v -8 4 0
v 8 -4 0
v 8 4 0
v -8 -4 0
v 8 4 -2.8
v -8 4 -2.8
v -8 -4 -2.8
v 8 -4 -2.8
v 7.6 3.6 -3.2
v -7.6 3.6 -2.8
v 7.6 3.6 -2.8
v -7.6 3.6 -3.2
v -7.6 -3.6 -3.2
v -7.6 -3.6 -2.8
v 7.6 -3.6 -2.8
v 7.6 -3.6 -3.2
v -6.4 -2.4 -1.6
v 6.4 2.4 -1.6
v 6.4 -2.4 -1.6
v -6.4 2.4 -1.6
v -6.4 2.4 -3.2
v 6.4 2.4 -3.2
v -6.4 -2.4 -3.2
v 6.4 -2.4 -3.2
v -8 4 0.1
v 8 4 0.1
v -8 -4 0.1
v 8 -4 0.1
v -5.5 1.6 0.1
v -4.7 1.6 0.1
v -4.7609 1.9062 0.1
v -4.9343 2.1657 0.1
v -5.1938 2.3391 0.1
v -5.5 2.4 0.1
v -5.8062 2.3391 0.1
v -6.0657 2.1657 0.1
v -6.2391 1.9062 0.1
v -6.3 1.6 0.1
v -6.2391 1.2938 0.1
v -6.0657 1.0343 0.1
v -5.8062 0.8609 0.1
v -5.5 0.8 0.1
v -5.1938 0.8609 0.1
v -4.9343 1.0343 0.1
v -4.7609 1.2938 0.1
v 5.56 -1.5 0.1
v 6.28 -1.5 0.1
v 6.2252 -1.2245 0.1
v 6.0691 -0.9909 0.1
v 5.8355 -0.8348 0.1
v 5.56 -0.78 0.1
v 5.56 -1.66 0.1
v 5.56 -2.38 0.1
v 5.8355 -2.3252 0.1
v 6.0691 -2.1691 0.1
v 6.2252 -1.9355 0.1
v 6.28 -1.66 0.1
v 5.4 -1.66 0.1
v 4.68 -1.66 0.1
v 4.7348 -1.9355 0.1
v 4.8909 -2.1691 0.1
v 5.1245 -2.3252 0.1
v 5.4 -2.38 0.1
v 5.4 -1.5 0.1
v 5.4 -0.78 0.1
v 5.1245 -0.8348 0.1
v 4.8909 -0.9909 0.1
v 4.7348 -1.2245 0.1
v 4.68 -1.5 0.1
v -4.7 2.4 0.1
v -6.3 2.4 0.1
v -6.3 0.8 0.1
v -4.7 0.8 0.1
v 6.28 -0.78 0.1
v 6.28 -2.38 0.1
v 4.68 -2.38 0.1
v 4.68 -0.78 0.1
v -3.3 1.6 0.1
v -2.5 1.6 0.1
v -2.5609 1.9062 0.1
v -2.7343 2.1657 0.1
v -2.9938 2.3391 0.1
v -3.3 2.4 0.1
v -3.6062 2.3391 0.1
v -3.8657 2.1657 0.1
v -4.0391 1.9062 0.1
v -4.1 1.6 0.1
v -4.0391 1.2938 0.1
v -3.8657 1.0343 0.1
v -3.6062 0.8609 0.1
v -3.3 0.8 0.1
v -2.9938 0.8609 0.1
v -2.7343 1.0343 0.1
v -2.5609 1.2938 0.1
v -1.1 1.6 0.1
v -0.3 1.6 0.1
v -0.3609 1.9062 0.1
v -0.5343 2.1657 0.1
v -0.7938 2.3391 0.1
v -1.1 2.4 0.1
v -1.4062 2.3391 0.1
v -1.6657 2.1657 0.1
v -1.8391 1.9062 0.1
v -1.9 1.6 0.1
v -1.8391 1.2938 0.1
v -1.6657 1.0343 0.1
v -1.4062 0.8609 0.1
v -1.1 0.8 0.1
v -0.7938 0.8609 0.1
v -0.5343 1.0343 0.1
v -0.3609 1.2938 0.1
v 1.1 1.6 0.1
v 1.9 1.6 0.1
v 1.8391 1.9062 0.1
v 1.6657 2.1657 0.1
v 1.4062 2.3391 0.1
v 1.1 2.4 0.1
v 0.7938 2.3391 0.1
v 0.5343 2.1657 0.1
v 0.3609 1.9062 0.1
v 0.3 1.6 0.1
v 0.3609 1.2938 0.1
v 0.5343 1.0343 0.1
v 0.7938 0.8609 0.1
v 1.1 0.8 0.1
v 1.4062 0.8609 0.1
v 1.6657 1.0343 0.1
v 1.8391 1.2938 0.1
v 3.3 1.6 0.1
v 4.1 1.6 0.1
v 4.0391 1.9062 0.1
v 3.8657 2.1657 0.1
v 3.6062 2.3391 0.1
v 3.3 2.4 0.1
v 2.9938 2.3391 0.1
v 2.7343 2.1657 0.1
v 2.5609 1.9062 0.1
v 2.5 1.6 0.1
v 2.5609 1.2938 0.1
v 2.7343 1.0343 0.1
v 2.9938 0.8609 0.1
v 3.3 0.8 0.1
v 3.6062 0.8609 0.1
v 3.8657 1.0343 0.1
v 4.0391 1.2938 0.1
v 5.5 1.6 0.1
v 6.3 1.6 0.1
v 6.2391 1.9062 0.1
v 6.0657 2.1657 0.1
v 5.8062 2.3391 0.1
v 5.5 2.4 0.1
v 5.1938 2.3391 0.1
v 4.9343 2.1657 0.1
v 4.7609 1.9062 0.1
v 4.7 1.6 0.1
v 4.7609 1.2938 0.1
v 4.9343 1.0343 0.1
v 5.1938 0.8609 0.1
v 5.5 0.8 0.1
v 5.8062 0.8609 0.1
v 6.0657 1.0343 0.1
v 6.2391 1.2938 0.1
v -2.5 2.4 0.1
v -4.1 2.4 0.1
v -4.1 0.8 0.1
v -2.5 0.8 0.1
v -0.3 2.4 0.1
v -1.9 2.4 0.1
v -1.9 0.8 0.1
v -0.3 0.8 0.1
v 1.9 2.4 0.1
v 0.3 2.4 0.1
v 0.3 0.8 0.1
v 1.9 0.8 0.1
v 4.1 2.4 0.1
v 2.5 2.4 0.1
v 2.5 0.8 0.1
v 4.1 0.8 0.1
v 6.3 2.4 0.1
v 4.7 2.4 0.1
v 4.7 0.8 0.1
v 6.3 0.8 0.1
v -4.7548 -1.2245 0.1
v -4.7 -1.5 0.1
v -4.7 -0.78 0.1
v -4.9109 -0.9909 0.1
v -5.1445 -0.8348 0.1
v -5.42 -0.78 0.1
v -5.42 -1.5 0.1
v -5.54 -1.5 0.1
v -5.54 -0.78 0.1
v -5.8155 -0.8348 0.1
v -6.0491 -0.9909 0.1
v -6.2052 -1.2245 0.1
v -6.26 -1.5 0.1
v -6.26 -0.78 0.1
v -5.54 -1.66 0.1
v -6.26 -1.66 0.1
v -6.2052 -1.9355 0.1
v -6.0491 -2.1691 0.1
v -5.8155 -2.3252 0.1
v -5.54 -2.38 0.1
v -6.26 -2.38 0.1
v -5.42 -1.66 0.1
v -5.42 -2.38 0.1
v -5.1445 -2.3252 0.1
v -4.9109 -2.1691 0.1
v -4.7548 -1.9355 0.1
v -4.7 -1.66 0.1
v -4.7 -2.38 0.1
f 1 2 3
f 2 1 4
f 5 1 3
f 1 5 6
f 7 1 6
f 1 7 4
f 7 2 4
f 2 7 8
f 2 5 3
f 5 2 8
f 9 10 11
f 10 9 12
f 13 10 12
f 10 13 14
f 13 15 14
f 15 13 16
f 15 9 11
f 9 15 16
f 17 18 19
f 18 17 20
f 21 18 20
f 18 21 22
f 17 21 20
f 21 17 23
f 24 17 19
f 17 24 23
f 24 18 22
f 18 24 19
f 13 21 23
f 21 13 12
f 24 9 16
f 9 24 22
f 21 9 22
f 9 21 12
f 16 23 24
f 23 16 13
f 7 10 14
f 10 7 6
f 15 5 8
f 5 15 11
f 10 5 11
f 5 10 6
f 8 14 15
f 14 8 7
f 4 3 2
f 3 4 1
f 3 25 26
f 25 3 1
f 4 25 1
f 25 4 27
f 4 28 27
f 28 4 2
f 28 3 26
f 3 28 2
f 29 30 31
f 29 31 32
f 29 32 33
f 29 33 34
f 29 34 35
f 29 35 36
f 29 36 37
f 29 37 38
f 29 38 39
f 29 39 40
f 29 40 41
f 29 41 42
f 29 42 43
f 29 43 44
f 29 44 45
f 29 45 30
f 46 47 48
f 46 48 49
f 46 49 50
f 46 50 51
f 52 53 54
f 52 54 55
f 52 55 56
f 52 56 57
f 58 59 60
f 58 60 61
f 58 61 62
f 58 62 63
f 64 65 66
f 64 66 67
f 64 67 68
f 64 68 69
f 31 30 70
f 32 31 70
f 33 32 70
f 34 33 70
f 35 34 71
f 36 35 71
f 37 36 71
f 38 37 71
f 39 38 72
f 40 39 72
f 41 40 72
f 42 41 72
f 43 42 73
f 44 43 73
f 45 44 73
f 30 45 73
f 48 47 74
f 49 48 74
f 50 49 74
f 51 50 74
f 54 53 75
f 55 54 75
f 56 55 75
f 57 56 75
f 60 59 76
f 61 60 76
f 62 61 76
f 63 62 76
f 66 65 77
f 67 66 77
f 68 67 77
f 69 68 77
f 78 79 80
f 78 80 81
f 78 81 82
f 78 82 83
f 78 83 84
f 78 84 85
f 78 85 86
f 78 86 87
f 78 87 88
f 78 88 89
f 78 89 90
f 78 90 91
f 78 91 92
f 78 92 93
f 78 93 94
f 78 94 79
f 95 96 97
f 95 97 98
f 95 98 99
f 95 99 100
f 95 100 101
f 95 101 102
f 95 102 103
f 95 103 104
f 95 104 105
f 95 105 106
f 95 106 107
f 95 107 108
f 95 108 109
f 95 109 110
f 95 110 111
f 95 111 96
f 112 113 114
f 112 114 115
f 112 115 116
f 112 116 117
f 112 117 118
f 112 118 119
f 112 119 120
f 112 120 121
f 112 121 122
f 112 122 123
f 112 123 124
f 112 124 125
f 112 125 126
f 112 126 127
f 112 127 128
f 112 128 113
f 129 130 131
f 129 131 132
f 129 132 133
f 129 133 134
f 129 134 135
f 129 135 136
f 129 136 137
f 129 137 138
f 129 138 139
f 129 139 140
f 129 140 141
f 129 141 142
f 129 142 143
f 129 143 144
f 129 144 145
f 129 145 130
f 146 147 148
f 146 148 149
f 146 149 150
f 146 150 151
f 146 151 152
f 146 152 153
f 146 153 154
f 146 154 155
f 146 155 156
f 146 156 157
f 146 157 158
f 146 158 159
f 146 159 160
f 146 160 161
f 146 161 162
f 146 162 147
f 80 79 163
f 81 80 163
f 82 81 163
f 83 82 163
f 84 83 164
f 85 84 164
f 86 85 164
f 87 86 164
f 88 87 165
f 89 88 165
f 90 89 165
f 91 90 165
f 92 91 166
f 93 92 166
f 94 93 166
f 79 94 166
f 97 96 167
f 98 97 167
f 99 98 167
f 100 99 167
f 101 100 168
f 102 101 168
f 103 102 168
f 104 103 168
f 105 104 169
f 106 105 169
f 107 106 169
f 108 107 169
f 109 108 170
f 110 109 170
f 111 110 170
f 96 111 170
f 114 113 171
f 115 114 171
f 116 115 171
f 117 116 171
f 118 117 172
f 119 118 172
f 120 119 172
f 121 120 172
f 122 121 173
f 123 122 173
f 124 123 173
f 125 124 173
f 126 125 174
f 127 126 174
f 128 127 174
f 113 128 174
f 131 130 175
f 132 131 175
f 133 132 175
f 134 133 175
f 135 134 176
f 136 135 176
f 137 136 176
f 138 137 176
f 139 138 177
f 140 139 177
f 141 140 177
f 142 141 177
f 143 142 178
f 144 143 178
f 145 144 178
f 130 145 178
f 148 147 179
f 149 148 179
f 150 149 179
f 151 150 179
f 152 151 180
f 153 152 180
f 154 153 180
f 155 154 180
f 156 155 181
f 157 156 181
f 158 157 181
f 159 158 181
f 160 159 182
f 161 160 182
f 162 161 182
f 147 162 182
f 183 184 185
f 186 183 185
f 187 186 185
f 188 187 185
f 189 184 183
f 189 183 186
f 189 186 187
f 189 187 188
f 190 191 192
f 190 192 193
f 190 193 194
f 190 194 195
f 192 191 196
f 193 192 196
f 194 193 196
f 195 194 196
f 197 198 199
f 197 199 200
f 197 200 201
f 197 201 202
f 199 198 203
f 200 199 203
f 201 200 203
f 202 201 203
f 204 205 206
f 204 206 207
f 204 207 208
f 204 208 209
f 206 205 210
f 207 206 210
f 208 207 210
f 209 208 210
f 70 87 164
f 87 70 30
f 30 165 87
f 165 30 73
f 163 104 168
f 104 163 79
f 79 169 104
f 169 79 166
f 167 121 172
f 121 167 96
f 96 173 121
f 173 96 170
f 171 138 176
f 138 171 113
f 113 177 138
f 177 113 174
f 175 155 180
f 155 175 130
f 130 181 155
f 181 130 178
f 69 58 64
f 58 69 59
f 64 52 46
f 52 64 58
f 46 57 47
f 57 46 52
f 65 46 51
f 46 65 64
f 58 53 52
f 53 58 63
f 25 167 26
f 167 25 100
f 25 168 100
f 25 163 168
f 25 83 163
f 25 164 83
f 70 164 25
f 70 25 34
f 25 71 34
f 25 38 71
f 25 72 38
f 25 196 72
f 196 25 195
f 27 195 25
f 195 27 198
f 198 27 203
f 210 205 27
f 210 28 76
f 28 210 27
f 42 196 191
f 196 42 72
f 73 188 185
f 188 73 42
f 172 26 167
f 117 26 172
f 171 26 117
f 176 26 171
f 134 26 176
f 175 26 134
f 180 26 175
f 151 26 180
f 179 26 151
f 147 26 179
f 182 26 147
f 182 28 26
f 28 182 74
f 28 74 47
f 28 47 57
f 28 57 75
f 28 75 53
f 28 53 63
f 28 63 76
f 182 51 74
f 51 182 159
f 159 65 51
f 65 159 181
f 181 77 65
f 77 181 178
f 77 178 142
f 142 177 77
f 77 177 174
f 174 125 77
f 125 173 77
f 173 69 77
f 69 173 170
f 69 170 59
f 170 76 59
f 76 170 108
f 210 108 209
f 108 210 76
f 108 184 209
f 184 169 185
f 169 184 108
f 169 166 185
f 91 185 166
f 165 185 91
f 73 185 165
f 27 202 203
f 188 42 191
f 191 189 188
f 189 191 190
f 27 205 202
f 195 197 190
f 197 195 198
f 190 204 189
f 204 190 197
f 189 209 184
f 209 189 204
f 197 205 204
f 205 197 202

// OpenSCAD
// file: ../p/box5.scad
use <../lib.scad>
function ldraw_lib__box5() = [
// 0 Box with 5 Faces and All Edges
// 0 Name: box5.dat
// 0 Author: James Jessiman
// 0 !LDRAW_ORG Primitive UPDATE 2012-01
// 0 !LICENSE Licensed under CC BY 4.0 : see CAreadme.txt
// 
// 0 BFC CERTIFY CCW
  [0,"BFC","CERTIFY"],
  [0,"BFC","CCW"],
// 
// 0 !HISTORY 2002-04-03 [sbliss] Modified for BFC compliance
// 0 !HISTORY 2002-04-25 [PTadmin] Official Update 2002-02
// 0 !HISTORY 2007-06-24 [PTadmin] Header formatted for Contributor Agreement
// 0 !HISTORY 2008-07-01 [PTadmin] Official Update 2008-01
// 0 !HISTORY 2012-02-16 [Philo] Changed to CCW
// 0 !HISTORY 2012-03-30 [PTadmin] Official Update 2012-01
// 
// 
// 2 24 1 1 1 -1 1 1
  [2,24,1,1,1,-1,1,1],
// 2 24 -1 1 1 -1 1 -1
  [2,24,-1,1,1,-1,1,-1],
// 2 24 -1 1 -1 1 1 -1
  [2,24,-1,1,-1,1,1,-1],
// 2 24 1 1 -1 1 1 1
  [2,24,1,1,-1,1,1,1],
// 2 24 1 0 1 -1 0 1
  [2,24,1,0,1,-1,0,1],
// 2 24 -1 0 1 -1 0 -1
  [2,24,-1,0,1,-1,0,-1],
// 2 24 -1 0 -1 1 0 -1
  [2,24,-1,0,-1,1,0,-1],
// 2 24 1 0 -1 1 0 1
  [2,24,1,0,-1,1,0,1],
// 2 24 1 0 1 1 1 1
  [2,24,1,0,1,1,1,1],
// 2 24 -1 0 1 -1 1 1
  [2,24,-1,0,1,-1,1,1],
// 2 24 1 0 -1 1 1 -1
  [2,24,1,0,-1,1,1,-1],
// 2 24 -1 0 -1 -1 1 -1
  [2,24,-1,0,-1,-1,1,-1],
// 4 16 -1 1 1 1 1 1 1 1 -1 -1 1 -1
  [4,16,-1,1,1,1,1,1,1,1,-1,-1,1,-1],
// 4 16 -1 1 1 -1 0 1 1 0 1 1 1 1
  [4,16,-1,1,1,-1,0,1,1,0,1,1,1,1],
// 4 16 -1 1 -1 -1 0 -1 -1 0 1 -1 1 1
  [4,16,-1,1,-1,-1,0,-1,-1,0,1,-1,1,1],
// 4 16 1 1 -1 1 0 -1 -1 0 -1 -1 1 -1
  [4,16,1,1,-1,1,0,-1,-1,0,-1,-1,1,-1],
// 4 16 1 1 1 1 0 1 1 0 -1 1 1 -1
  [4,16,1,1,1,1,0,1,1,0,-1,1,1,-1],
];
module ldraw_lib__box5(step=0, col=false, unit=2/5, alt=false, line=0.2, solid=!$preview)
    makepoly(ldraw_lib__box5(), step=step, col=col, unit=unit, alt=alt, line=line, solid=solid);
ldraw_lib__box5(line=0.2);
// file: ../p/box4.scad
use <../lib.scad>
function ldraw_lib__box4() = [
// 0 Box with 4 Faces (2 Parallel Pairs) and All Edges
// 0 Name: box4.dat
// 0 Author: James Jessiman
// 0 !LDRAW_ORG Primitive UPDATE 2012-01
// 0 !LICENSE Licensed under CC BY 4.0 : see CAreadme.txt
// 
// 0 BFC CERTIFY CCW
  [0,"BFC","CERTIFY"],
  [0,"BFC","CCW"],
// 
// 0 !HISTORY 2002-04-03 [sbliss] Modified for BFC compliance
// 0 !HISTORY 2002-04-25 [PTadmin] Official Update 2002-02
// 0 !HISTORY 2007-06-24 [PTadmin] Header formatted for Contributor Agreement
// 0 !HISTORY 2008-07-01 [PTadmin] Official Update 2008-01
// 0 !HISTORY 2012-02-16 [Philo] Changed to CCW
// 0 !HISTORY 2012-03-30 [PTadmin] Official Update 2012-01
// 
// 
// 2 24 1 1 1 -1 1 1
  [2,24,1,1,1,-1,1,1],
// 2 24 -1 1 1 -1 1 -1
  [2,24,-1,1,1,-1,1,-1],
// 2 24 -1 1 -1 1 1 -1
  [2,24,-1,1,-1,1,1,-1],
// 2 24 1 1 -1 1 1 1
  [2,24,1,1,-1,1,1,1],
// 2 24 1 0 1 -1 0 1
  [2,24,1,0,1,-1,0,1],
// 2 24 -1 0 1 -1 0 -1
  [2,24,-1,0,1,-1,0,-1],
// 2 24 -1 0 -1 1 0 -1
  [2,24,-1,0,-1,1,0,-1],
// 2 24 1 0 -1 1 0 1
  [2,24,1,0,-1,1,0,1],
// 2 24 1 0 1 1 1 1
  [2,24,1,0,1,1,1,1],
// 2 24 -1 0 1 -1 1 1
  [2,24,-1,0,1,-1,1,1],
// 2 24 1 0 -1 1 1 -1
  [2,24,1,0,-1,1,1,-1],
// 2 24 -1 0 -1 -1 1 -1
  [2,24,-1,0,-1,-1,1,-1],
// 4 16 -1 1 1 -1 0 1 1 0 1 1 1 1
  [4,16,-1,1,1,-1,0,1,1,0,1,1,1,1],
// 4 16 -1 1 -1 -1 0 -1 -1 0 1 -1 1 1
  [4,16,-1,1,-1,-1,0,-1,-1,0,1,-1,1,1],
// 4 16 1 1 -1 1 0 -1 -1 0 -1 -1 1 -1
  [4,16,1,1,-1,1,0,-1,-1,0,-1,-1,1,-1],
// 4 16 1 1 1 1 0 1 1 0 -1 1 1 -1
  [4,16,1,1,1,1,0,1,1,0,-1,1,1,-1],
];
module ldraw_lib__box4(step=0, col=false, unit=2/5, alt=false, line=0.2, solid=!$preview)
    makepoly(ldraw_lib__box4(), step=step, col=col, unit=unit, alt=alt, line=line, solid=solid);
ldraw_lib__box4(line=0.2);
// file: s/3069bs01.scad
use <../../lib.scad>
use <../../p/box4.scad>
use <../../p/box5.scad>
function ldraw_lib__s__3069bs01() = [
// 0 ~Tile  1 x  2 with Groove without Top Face
// 0 Name: s\3069bs01.dat
// 0 Author: Santeri Piippo [arezey]
// 0 !LDRAW_ORG Subpart UPDATE 2010-02
// 0 !LICENSE Licensed under CC BY 4.0 : see CAreadme.txt
// 
// 0 BFC CERTIFY CCW
  [0,"BFC","CERTIFY"],
  [0,"BFC","CCW"],
// 
// 0 !HISTORY 2010-07-05 [PTadmin] Official Update 2010-02
// 
// 
// 1 16 0 0 0 20 0 0 0 7 0 0 0 10 box4.dat
  [1,16,0,0,0,20,0,0,0,7,0,0,0,10, ldraw_lib__box4()],
// 1 16 0 7 0 19 0 0 0 1 0 0 0 9 box4.dat
  [1,16,0,7,0,19,0,0,0,1,0,0,0,9, ldraw_lib__box4()],
// 0 BFC INVERTNEXT
  [0,"BFC","INVERTNEXT"],
// 1 16 0 8 0 16 0 0 0 -4 0 0 0 6 box5.dat
  [1,16,0,8,0,16,0,0,0,-4,0,0,0,6, ldraw_lib__box5()],
// 4 16 -19 8 9 -16 8 6 -16 8 -6 -19 8 -9
  [4,16,-19,8,9,-16,8,6,-16,8,-6,-19,8,-9],
// 4 16 19 8 -9 16 8 -6 16 8 6 19 8 9
  [4,16,19,8,-9,16,8,-6,16,8,6,19,8,9],
// 4 16 19 8 9 16 8 6 -16 8 6 -19 8 9
  [4,16,19,8,9,16,8,6,-16,8,6,-19,8,9],
// 4 16 -19 8 -9 -16 8 -6 16 8 -6 19 8 -9
  [4,16,-19,8,-9,-16,8,-6,16,8,-6,19,8,-9],
// 4 16 -20 7 10 -19 7 9 -19 7 -9 -20 7 -10
  [4,16,-20,7,10,-19,7,9,-19,7,-9,-20,7,-10],
// 4 16 20 7 -10 19 7 -9 19 7 9 20 7 10
  [4,16,20,7,-10,19,7,-9,19,7,9,20,7,10],
// 4 16 20 7 10 19 7 9 -19 7 9 -20 7 10
  [4,16,20,7,10,19,7,9,-19,7,9,-20,7,10],
// 4 16 -20 7 -10 -19 7 -9 19 7 -9 20 7 -10
  [4,16,-20,7,-10,-19,7,-9,19,7,-9,20,7,-10],
// 0 //
];
module ldraw_lib__s__3069bs01(step=0, col=false, unit=2/5, alt=false, line=0.2, solid=!$preview)
    makepoly(ldraw_lib__s__3069bs01(), step=step, col=col, unit=unit, alt=alt, line=line, solid=solid);
ldraw_lib__s__3069bs01(line=0.2);
// file: ../p/box5-12.scad
use <../lib.scad>
function ldraw_lib__box5_12() = [
// 0 Box with 5 Faces without Any Edges
// 0 Name: box5-12.dat
// 0 Author: Chris Dee [cwdee]
// 0 !LDRAW_ORG Primitive UPDATE 2009-02
// 0 !LICENSE Licensed under CC BY 4.0 : see CAreadme.txt
// 
// 0 BFC CERTIFY CCW
  [0,"BFC","CERTIFY"],
  [0,"BFC","CCW"],
// 
// 0 !HISTORY 2009-09-03 [PTadmin] Official Update 2009-02
// 
// 
// 4 16 1 1 1 1 1 -1 -1 1 -1 -1 1 1
  [4,16,1,1,1,1,1,-1,-1,1,-1,-1,1,1],
// 4 16 -1 0 1 1 0 1 1 1 1 -1 1 1
  [4,16,-1,0,1,1,0,1,1,1,1,-1,1,1],
// 4 16 -1 0 -1 -1 0 1 -1 1 1 -1 1 -1
  [4,16,-1,0,-1,-1,0,1,-1,1,1,-1,1,-1],
// 4 16 1 0 -1 -1 0 -1 -1 1 -1 1 1 -1
  [4,16,1,0,-1,-1,0,-1,-1,1,-1,1,1,-1],
// 4 16 1 0 1 1 0 -1 1 1 -1 1 1 1
  [4,16,1,0,1,1,0,-1,1,1,-1,1,1,1],
// 0
];
module ldraw_lib__box5_12(step=0, col=false, unit=2/5, alt=false, line=0.2, solid=!$preview)
    makepoly(ldraw_lib__box5_12(), step=step, col=col, unit=unit, alt=alt, line=line, solid=solid);
ldraw_lib__box5_12(line=0.2);
// file: ../p/4-4ndis.scad
use <../lib.scad>
function ldraw_lib__4_4ndis() = [
// 0 Disc Negative 1.0
// 0 Name: 4-4ndis.dat
// 0 Author: James Jessiman
// 0 !LDRAW_ORG Primitive UPDATE 2012-01
// 0 !LICENSE Licensed under CC BY 4.0 : see CAreadme.txt
// 
// 0 BFC CERTIFY CCW
  [0,"BFC","CERTIFY"],
  [0,"BFC","CCW"],
// 
// 0 !HISTORY 2002-03-23 [sbliss] Added BFC statement; compacted code
// 0 !HISTORY 2002-04-25 [PTadmin] Official Update 2002-02
// 0 !HISTORY 2007-06-24 [PTadmin] Header formatted for Contributor Agreement
// 0 !HISTORY 2008-07-01 [PTadmin] Official Update 2008-01
// 0 !HISTORY 2012-02-16 [Philo] Changed to CCW
// 0 !HISTORY 2012-03-30 [PTadmin] Official Update 2012-01
// 
// 
// 3 16 0.9239 0 0.3827 1 0 0 1 0 1
  [3,16,0.9239,0,0.3827,1,0,0,1,0,1],
// 3 16 0.7071 0 0.7071 0.9239 0 0.3827 1 0 1
  [3,16,0.7071,0,0.7071,0.9239,0,0.3827,1,0,1],
// 3 16 0.3827 0 0.9239 0.7071 0 0.7071 1 0 1
  [3,16,0.3827,0,0.9239,0.7071,0,0.7071,1,0,1],
// 3 16 0 0 1 0.3827 0 0.9239 1 0 1
  [3,16,0,0,1,0.3827,0,0.9239,1,0,1],
// 3 16 -0.3827 0 0.9239 0 0 1 -1 0 1
  [3,16,-0.3827,0,0.9239,0,0,1,-1,0,1],
// 3 16 -0.7071 0 0.7071 -0.3827 0 0.9239 -1 0 1
  [3,16,-0.7071,0,0.7071,-0.3827,0,0.9239,-1,0,1],
// 3 16 -0.9239 0 0.3827 -0.7071 0 0.7071 -1 0 1
  [3,16,-0.9239,0,0.3827,-0.7071,0,0.7071,-1,0,1],
// 3 16 -1 0 0 -0.9239 0 0.3827 -1 0 1
  [3,16,-1,0,0,-0.9239,0,0.3827,-1,0,1],
// 3 16 -0.9239 0 -0.3827 -1 0 0 -1 0 -1
  [3,16,-0.9239,0,-0.3827,-1,0,0,-1,0,-1],
// 3 16 -0.7071 0 -0.7071 -0.9239 0 -0.3827 -1 0 -1
  [3,16,-0.7071,0,-0.7071,-0.9239,0,-0.3827,-1,0,-1],
// 3 16 -0.3827 0 -0.9239 -0.7071 0 -0.7071 -1 0 -1
  [3,16,-0.3827,0,-0.9239,-0.7071,0,-0.7071,-1,0,-1],
// 3 16 0 0 -1 -0.3827 0 -0.9239 -1 0 -1
  [3,16,0,0,-1,-0.3827,0,-0.9239,-1,0,-1],
// 3 16 0.3827 0 -0.9239 0 0 -1 1 0 -1
  [3,16,0.3827,0,-0.9239,0,0,-1,1,0,-1],
// 3 16 0.7071 0 -0.7071 0.3827 0 -0.9239 1 0 -1
  [3,16,0.7071,0,-0.7071,0.3827,0,-0.9239,1,0,-1],
// 3 16 0.9239 0 -0.3827 0.7071 0 -0.7071 1 0 -1
  [3,16,0.9239,0,-0.3827,0.7071,0,-0.7071,1,0,-1],
// 3 16 1 0 0 0.9239 0 -0.3827 1 0 -1
  [3,16,1,0,0,0.9239,0,-0.3827,1,0,-1],
];
module ldraw_lib__4_4ndis(step=0, col=false, unit=2/5, alt=false, line=0.2, solid=!$preview)
    makepoly(ldraw_lib__4_4ndis(), step=step, col=col, unit=unit, alt=alt, line=line, solid=solid);
ldraw_lib__4_4ndis(line=0.2);
// file: ../p/4-4disc.scad
use <../lib.scad>
function ldraw_lib__4_4disc() = [
// 0 Disc 1.0
// 0 Name: 4-4disc.dat
// 0 Author: James Jessiman
// 0 !LDRAW_ORG Primitive UPDATE 2002-02
// 0 !LICENSE Licensed under CC BY 4.0 : see CAreadme.txt
// 
// 0 BFC CERTIFY CCW
  [0,"BFC","CERTIFY"],
  [0,"BFC","CCW"],
// 
// 0 !HISTORY 1998-12-15 [PTadmin] Official Update 1998-10
// 0 !HISTORY 2002-03-23 [sbliss] Added BFC statement
// 0 !HISTORY 2002-04-25 [PTadmin] Official Update 2002-02
// 0 !HISTORY 2007-06-24 [PTadmin] Header formatted for Contributor Agreement
// 0 !HISTORY 2008-07-01 [PTadmin] Official Update 2008-01
// 
// 
// 3 16 0 0 0 1 0 0 0.9239 0 0.3827
  [3,16,0,0,0,1,0,0,0.9239,0,0.3827],
// 3 16 0 0 0 0.9239 0 0.3827 0.7071 0 0.7071
  [3,16,0,0,0,0.9239,0,0.3827,0.7071,0,0.7071],
// 3 16 0 0 0 0.7071 0 0.7071 0.3827 0 0.9239
  [3,16,0,0,0,0.7071,0,0.7071,0.3827,0,0.9239],
// 3 16 0 0 0 0.3827 0 0.9239 0 0 1
  [3,16,0,0,0,0.3827,0,0.9239,0,0,1],
// 3 16 0 0 0 0 0 1 -0.3827 0 0.9239
  [3,16,0,0,0,0,0,1,-0.3827,0,0.9239],
// 3 16 0 0 0 -0.3827 0 0.9239 -0.7071 0 0.7071
  [3,16,0,0,0,-0.3827,0,0.9239,-0.7071,0,0.7071],
// 3 16 0 0 0 -0.7071 0 0.7071 -0.9239 0 0.3827
  [3,16,0,0,0,-0.7071,0,0.7071,-0.9239,0,0.3827],
// 3 16 0 0 0 -0.9239 0 0.3827 -1 0 -0
  [3,16,0,0,0,-0.9239,0,0.3827,-1,0,-0],
// 3 16 0 0 0 -1 0 -0 -0.9239 0 -0.3827
  [3,16,0,0,0,-1,0,-0,-0.9239,0,-0.3827],
// 3 16 0 0 0 -0.9239 0 -0.3827 -0.7071 0 -0.7071
  [3,16,0,0,0,-0.9239,0,-0.3827,-0.7071,0,-0.7071],
// 3 16 0 0 0 -0.7071 0 -0.7071 -0.3827 0 -0.9239
  [3,16,0,0,0,-0.7071,0,-0.7071,-0.3827,0,-0.9239],
// 3 16 0 0 0 -0.3827 0 -0.9239 0 0 -1
  [3,16,0,0,0,-0.3827,0,-0.9239,0,0,-1],
// 3 16 0 0 0 0 0 -1 0.3827 0 -0.9239
  [3,16,0,0,0,0,0,-1,0.3827,0,-0.9239],
// 3 16 0 0 0 0.3827 0 -0.9239 0.7071 0 -0.7071
  [3,16,0,0,0,0.3827,0,-0.9239,0.7071,0,-0.7071],
// 3 16 0 0 0 0.7071 0 -0.7071 0.9239 0 -0.3827
  [3,16,0,0,0,0.7071,0,-0.7071,0.9239,0,-0.3827],
// 3 16 0 0 0 0.9239 0 -0.3827 1 0 0
  [3,16,0,0,0,0.9239,0,-0.3827,1,0,0],
// 0
];
module ldraw_lib__4_4disc(step=0, col=false, unit=2/5, alt=false, line=0.2, solid=!$preview)
    makepoly(ldraw_lib__4_4disc(), step=step, col=col, unit=unit, alt=alt, line=line, solid=solid);
ldraw_lib__4_4disc(line=0.2);
// file: ../p/1-4ndis.scad
use <../lib.scad>
function ldraw_lib__1_4ndis() = [
// 0 Disc Negative 0.25
// 0 Name: 1-4ndis.dat
// 0 Author: James Jessiman
// 0 !LDRAW_ORG Primitive UPDATE 2012-01
// 0 !LICENSE Licensed under CC BY 4.0 : see CAreadme.txt
// 
// 0 BFC CERTIFY CCW
  [0,"BFC","CERTIFY"],
  [0,"BFC","CCW"],
// 
// 0 !HISTORY 2002-03-23 [sbliss] Added BFC Statement
// 0 !HISTORY 2002-04-25 [PTadmin] Official Update 2002-02
// 0 !HISTORY 2007-06-22 [PTadmin] Header formatted for Contributor Agreement
// 0 !HISTORY 2008-07-01 [PTadmin] Official Update 2008-01
// 0 !HISTORY 2012-02-16 [Philo] Changed to CCW
// 0 !HISTORY 2012-03-30 [PTadmin] Official Update 2012-01
// 
// 
// 3 16 0.9239 0 0.3827 1 0 0 1 0 1
  [3,16,0.9239,0,0.3827,1,0,0,1,0,1],
// 3 16 0.7071 0 0.7071 0.9239 0 0.3827 1 0 1
  [3,16,0.7071,0,0.7071,0.9239,0,0.3827,1,0,1],
// 3 16 0.3827 0 0.9239 0.7071 0 0.7071 1 0 1
  [3,16,0.3827,0,0.9239,0.7071,0,0.7071,1,0,1],
// 3 16 0 0 1 0.3827 0 0.9239 1 0 1
  [3,16,0,0,1,0.3827,0,0.9239,1,0,1],
];
module ldraw_lib__1_4ndis(step=0, col=false, unit=2/5, alt=false, line=0.2, solid=!$preview)
    makepoly(ldraw_lib__1_4ndis(), step=step, col=col, unit=unit, alt=alt, line=line, solid=solid);
ldraw_lib__1_4ndis(line=0.2);
// file: ../p/1-4disc.scad
use <../lib.scad>
function ldraw_lib__1_4disc() = [
// 0 Disc 0.25
// 0 Name: 1-4disc.dat
// 0 Author: James Jessiman
// 0 !LDRAW_ORG Primitive UPDATE 2002-02
// 0 !LICENSE Licensed under CC BY 4.0 : see CAreadme.txt
// 
// 0 BFC CERTIFY CCW
  [0,"BFC","CERTIFY"],
  [0,"BFC","CCW"],
// 
// 0 !HISTORY 2002-03-23 [sbliss] Added BFC statement.
// 0 !HISTORY 2002-04-25 [PTadmin] Official Update 2002-02
// 0 !HISTORY 2007-06-22 [PTadmin] Header formatted for Contributor Agreement
// 0 !HISTORY 2008-07-01 [PTadmin] Official Update 2008-01
// 
// 
// 3 16 0 0 0 1 0 0 0.9239 0 0.3827
  [3,16,0,0,0,1,0,0,0.9239,0,0.3827],
// 3 16 0 0 0 0.9239 0 0.3827 0.7071 0 0.7071
  [3,16,0,0,0,0.9239,0,0.3827,0.7071,0,0.7071],
// 3 16 0 0 0 0.7071 0 0.7071 0.3827 0 0.9239
  [3,16,0,0,0,0.7071,0,0.7071,0.3827,0,0.9239],
// 3 16 0 0 0 0.3827 0 0.9239 0 0 1
  [3,16,0,0,0,0.3827,0,0.9239,0,0,1],
// 0
];
module ldraw_lib__1_4disc(step=0, col=false, unit=2/5, alt=false, line=0.2, solid=!$preview)
    makepoly(ldraw_lib__1_4disc(), step=step, col=col, unit=unit, alt=alt, line=line, solid=solid);
ldraw_lib__1_4disc(line=0.2);
// file: 3069b.scad
use <../lib.scad>
use <s/3069bs01.scad>
function ldraw_lib__3069b() = [
// 0 Tile  1 x  2 with Groove
// 0 Name: 3069b.dat
// 0 Author: Santeri Piippo [arezey]
// 0 !LDRAW_ORG Part UPDATE 2010-02
// 0 !LICENSE Licensed under CC BY 4.0 : see CAreadme.txt
// 
// 0 BFC CERTIFY CCW
  [0,"BFC","CERTIFY"],
  [0,"BFC","CCW"],
// 
// 0 !KEYWORDS BrickLink 3069
// 
// 0 !HISTORY 2010-07-05 [PTadmin] Official Update 2010-02
// 
// 
// 4 16 20 0 -10 20 0 10 -20 0 10 -20 0 -10
  [4,16,20,0,-10,20,0,10,-20,0,10,-20,0,-10],
// 1 16 0 0 0 1 0 0 0 1 0 0 0 1 s\3069bs01.dat
  [1,16,0,0,0,1,0,0,0,1,0,0,0,1, ldraw_lib__s__3069bs01()],
// 0 //
];
module ldraw_lib__3069b(step=0, col=false, unit=2/5, alt=false, line=0.2, solid=!$preview)
    makepoly(ldraw_lib__3069b(), step=step, col=col, unit=unit, alt=alt, line=line, solid=solid);
ldraw_lib__3069b(line=0.2);
// main file
use <../lib.scad>
use <004695e.scad>
use <3069b.scad>
function ldraw_lib__3069bd02() = [
// 0 Tile  1 x  2 with Groove with Black 12V Battery Top Sticker
// 0 Name: 3069bd02.dat
// 0 Author: J.C. Tchang [tchang]
// 0 !LDRAW_ORG Shortcut UPDATE 2026-05
// 0 !LICENSE Licensed under CC BY 4.0 : see CAreadme.txt
// 
// 0 BFC CERTIFY CCW
  [0,"BFC","CERTIFY"],
  [0,"BFC","CCW"],
// 
// 0 !CATEGORY Sticker Shortcut
// 
// 0 !KEYWORDS Set 377
// 
// 0 !HISTORY 2014-11-28 [MagFors] Updated description
// 0 !HISTORY 2014-12-23 [PTadmin] Official Update 2014-02
// 0 !HISTORY 2024-05-27 [OrionP] Change category to Sticker Shortcut
// 0 !HISTORY 2024-05-28 [OrionP] Official Update 2024-04
// 0 !HISTORY 2026-04-28 [Sirio] Changed description: moved "Sticker" to end
// 0 !HISTORY 2026-05-31 [OrionP] Official Update 2026-05
// 
// 1 16 0 0 0 1 0 0 0 1 0 0 0 1 3069b.dat
  [1,16,0,0,0,1,0,0,0,1,0,0,0,1, ldraw_lib__3069b()],
// 1 16 0 0 0 1 0 0 0 1 0 0 0 1 004695e.dat
  [1,16,0,0,0,1,0,0,0,1,0,0,0,1, ldraw_lib__004695e()],
];
module ldraw_lib__3069bd02(step=0, col=false, unit=2/5, alt=false, line=0.2, solid=!$preview)
    makepoly(ldraw_lib__3069bd02(), step=step, col=col, unit=unit, alt=alt, line=line, solid=solid);
ldraw_lib__3069bd02(line=0.2);
